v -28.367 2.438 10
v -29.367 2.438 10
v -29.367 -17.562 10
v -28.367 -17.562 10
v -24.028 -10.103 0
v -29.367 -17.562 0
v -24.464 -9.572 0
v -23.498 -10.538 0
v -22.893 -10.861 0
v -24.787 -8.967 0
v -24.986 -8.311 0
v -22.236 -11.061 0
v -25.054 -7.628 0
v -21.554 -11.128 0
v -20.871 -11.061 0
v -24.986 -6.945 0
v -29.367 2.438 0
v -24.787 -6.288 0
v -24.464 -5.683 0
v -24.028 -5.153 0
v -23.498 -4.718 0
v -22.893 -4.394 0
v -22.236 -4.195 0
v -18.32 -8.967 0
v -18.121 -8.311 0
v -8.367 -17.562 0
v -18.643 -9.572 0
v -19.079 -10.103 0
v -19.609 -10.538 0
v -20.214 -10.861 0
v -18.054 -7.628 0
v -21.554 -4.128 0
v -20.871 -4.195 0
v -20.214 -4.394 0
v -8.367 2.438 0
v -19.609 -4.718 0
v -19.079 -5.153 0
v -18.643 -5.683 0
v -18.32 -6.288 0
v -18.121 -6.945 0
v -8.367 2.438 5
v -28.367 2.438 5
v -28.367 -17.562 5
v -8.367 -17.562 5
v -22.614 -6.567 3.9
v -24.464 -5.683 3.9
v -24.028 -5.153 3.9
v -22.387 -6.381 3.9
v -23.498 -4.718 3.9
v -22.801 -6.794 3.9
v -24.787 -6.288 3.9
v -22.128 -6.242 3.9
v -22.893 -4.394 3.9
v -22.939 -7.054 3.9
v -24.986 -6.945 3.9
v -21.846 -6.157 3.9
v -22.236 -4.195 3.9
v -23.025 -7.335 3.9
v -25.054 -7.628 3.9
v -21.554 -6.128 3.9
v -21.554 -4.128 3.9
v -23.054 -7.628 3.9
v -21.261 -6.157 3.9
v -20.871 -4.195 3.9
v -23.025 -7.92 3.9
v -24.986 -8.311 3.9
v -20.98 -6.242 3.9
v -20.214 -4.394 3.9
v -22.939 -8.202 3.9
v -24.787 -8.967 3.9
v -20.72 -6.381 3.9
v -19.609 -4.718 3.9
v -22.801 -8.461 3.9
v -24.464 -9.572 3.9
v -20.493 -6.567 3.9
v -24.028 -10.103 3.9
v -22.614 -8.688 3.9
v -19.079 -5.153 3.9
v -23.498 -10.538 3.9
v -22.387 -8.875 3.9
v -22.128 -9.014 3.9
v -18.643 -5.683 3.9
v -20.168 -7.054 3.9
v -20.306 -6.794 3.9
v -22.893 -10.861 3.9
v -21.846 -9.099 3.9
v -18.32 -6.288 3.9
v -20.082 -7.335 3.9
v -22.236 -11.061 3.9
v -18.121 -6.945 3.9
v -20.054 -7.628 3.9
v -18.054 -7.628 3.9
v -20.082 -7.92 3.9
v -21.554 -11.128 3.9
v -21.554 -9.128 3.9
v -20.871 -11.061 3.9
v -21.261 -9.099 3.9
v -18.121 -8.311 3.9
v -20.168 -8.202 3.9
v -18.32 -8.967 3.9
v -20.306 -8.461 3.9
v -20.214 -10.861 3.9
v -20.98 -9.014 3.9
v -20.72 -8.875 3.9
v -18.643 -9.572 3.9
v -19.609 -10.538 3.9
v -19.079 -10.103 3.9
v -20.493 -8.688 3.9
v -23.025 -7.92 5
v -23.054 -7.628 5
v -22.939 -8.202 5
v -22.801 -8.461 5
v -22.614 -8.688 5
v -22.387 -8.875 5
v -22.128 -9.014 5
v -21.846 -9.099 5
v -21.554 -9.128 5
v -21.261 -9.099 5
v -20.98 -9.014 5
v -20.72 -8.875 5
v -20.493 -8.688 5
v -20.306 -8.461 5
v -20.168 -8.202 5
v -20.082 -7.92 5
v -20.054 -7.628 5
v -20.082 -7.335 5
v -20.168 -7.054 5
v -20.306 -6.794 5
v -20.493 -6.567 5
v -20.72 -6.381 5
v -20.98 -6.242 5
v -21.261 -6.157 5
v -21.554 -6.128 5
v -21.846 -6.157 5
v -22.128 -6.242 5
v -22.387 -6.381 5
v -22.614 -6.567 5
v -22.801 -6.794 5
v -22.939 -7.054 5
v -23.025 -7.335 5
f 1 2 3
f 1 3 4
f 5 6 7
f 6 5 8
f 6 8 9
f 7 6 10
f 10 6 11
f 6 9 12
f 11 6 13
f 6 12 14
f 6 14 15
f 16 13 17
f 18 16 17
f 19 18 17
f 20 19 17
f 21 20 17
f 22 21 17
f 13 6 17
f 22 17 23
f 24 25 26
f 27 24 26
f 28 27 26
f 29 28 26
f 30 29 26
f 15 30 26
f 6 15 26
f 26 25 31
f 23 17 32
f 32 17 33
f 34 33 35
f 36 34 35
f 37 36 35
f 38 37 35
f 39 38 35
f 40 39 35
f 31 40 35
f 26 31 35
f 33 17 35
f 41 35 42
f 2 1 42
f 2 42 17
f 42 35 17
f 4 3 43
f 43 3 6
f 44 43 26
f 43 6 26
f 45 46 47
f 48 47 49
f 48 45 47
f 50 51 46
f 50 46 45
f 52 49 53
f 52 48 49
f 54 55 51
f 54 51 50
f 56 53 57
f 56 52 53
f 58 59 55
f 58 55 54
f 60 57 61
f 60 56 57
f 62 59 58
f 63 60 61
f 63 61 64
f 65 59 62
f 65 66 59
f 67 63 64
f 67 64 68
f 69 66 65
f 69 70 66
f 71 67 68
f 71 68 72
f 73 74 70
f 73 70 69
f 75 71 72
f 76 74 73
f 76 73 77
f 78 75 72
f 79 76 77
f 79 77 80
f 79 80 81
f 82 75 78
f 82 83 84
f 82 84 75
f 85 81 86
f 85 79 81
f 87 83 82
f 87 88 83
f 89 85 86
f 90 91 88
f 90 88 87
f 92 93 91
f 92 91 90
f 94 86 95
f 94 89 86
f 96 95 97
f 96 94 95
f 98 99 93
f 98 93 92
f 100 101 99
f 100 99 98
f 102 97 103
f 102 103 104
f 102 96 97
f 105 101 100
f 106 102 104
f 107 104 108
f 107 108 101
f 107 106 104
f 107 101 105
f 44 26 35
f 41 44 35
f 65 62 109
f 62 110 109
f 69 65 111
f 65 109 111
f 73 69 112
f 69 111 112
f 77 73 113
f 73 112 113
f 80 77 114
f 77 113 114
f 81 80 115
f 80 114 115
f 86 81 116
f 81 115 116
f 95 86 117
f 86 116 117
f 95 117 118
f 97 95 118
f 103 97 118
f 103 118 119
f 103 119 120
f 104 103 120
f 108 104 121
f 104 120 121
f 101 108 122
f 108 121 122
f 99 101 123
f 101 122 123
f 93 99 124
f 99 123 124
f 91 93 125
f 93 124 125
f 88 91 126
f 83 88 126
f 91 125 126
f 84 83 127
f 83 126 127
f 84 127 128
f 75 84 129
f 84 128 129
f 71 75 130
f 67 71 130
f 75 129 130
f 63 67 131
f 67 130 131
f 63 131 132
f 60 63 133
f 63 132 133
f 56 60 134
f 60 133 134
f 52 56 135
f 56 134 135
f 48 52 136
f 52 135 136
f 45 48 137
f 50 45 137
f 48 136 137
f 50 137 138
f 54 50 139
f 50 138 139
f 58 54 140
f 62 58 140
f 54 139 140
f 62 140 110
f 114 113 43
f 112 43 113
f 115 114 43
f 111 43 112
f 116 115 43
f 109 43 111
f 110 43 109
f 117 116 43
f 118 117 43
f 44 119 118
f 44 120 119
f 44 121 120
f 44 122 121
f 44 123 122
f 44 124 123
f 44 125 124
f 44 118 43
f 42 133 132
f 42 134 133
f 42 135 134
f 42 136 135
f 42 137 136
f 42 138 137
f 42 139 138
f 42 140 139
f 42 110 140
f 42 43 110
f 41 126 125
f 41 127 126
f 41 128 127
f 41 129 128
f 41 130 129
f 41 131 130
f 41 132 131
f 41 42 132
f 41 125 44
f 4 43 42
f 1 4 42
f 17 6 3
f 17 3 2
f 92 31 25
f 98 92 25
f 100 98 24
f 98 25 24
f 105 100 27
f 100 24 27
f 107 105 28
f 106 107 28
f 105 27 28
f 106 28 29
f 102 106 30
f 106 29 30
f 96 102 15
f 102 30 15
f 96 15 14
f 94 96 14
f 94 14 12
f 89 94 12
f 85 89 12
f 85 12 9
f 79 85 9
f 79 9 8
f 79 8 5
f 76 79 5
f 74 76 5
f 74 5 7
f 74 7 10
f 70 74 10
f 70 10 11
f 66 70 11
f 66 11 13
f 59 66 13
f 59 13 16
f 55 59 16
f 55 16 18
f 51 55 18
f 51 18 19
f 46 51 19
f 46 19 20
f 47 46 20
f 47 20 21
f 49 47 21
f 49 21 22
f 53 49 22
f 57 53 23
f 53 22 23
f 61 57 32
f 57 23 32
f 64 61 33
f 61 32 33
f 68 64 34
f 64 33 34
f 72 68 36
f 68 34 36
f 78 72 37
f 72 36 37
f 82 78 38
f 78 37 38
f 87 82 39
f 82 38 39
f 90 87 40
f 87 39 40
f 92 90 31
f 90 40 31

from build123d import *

# Parameters (mm, degrees)
F0_W           = 1
F0_H           = 20
F1_DEPTH       = 10
F0_W_2         = 20
F2_DEPTH       = 5
F4_D           = 3
F4_CBORE_D     = 7
F4_CBORE_DEPTH = 3.9


with BuildPart() as f1:
    # F0 (on Top) → F1 (new body)
    with BuildSketch(Plane.XY):
        with Locations((-28.8674156551, -7.5615978579)):
            Rectangle(F0_W, F0_H)
    extrude(amount=F1_DEPTH)

    # F0 (on Top) → F2 (join)
    with BuildSketch(Plane.XY):
        with Locations((-18.3674156551, -7.5615978579)):
            Rectangle(F0_W_2, F0_H)
        with Locations((-28.8674156551, -7.5615978579)):
            Rectangle(F0_W, F0_H)
    extrude(amount=F2_DEPTH)

    # F4 (through all)
    with Locations(Plane(origin=(0, 0, 0), x_dir=(1, 0, 0), z_dir=(0, 0, -1))):
        with Locations((-21.5535256551, 7.6278164051)):
            CounterBoreHole(F4_D / 2, F4_CBORE_D / 2, F4_CBORE_DEPTH)


solid = f1.part
